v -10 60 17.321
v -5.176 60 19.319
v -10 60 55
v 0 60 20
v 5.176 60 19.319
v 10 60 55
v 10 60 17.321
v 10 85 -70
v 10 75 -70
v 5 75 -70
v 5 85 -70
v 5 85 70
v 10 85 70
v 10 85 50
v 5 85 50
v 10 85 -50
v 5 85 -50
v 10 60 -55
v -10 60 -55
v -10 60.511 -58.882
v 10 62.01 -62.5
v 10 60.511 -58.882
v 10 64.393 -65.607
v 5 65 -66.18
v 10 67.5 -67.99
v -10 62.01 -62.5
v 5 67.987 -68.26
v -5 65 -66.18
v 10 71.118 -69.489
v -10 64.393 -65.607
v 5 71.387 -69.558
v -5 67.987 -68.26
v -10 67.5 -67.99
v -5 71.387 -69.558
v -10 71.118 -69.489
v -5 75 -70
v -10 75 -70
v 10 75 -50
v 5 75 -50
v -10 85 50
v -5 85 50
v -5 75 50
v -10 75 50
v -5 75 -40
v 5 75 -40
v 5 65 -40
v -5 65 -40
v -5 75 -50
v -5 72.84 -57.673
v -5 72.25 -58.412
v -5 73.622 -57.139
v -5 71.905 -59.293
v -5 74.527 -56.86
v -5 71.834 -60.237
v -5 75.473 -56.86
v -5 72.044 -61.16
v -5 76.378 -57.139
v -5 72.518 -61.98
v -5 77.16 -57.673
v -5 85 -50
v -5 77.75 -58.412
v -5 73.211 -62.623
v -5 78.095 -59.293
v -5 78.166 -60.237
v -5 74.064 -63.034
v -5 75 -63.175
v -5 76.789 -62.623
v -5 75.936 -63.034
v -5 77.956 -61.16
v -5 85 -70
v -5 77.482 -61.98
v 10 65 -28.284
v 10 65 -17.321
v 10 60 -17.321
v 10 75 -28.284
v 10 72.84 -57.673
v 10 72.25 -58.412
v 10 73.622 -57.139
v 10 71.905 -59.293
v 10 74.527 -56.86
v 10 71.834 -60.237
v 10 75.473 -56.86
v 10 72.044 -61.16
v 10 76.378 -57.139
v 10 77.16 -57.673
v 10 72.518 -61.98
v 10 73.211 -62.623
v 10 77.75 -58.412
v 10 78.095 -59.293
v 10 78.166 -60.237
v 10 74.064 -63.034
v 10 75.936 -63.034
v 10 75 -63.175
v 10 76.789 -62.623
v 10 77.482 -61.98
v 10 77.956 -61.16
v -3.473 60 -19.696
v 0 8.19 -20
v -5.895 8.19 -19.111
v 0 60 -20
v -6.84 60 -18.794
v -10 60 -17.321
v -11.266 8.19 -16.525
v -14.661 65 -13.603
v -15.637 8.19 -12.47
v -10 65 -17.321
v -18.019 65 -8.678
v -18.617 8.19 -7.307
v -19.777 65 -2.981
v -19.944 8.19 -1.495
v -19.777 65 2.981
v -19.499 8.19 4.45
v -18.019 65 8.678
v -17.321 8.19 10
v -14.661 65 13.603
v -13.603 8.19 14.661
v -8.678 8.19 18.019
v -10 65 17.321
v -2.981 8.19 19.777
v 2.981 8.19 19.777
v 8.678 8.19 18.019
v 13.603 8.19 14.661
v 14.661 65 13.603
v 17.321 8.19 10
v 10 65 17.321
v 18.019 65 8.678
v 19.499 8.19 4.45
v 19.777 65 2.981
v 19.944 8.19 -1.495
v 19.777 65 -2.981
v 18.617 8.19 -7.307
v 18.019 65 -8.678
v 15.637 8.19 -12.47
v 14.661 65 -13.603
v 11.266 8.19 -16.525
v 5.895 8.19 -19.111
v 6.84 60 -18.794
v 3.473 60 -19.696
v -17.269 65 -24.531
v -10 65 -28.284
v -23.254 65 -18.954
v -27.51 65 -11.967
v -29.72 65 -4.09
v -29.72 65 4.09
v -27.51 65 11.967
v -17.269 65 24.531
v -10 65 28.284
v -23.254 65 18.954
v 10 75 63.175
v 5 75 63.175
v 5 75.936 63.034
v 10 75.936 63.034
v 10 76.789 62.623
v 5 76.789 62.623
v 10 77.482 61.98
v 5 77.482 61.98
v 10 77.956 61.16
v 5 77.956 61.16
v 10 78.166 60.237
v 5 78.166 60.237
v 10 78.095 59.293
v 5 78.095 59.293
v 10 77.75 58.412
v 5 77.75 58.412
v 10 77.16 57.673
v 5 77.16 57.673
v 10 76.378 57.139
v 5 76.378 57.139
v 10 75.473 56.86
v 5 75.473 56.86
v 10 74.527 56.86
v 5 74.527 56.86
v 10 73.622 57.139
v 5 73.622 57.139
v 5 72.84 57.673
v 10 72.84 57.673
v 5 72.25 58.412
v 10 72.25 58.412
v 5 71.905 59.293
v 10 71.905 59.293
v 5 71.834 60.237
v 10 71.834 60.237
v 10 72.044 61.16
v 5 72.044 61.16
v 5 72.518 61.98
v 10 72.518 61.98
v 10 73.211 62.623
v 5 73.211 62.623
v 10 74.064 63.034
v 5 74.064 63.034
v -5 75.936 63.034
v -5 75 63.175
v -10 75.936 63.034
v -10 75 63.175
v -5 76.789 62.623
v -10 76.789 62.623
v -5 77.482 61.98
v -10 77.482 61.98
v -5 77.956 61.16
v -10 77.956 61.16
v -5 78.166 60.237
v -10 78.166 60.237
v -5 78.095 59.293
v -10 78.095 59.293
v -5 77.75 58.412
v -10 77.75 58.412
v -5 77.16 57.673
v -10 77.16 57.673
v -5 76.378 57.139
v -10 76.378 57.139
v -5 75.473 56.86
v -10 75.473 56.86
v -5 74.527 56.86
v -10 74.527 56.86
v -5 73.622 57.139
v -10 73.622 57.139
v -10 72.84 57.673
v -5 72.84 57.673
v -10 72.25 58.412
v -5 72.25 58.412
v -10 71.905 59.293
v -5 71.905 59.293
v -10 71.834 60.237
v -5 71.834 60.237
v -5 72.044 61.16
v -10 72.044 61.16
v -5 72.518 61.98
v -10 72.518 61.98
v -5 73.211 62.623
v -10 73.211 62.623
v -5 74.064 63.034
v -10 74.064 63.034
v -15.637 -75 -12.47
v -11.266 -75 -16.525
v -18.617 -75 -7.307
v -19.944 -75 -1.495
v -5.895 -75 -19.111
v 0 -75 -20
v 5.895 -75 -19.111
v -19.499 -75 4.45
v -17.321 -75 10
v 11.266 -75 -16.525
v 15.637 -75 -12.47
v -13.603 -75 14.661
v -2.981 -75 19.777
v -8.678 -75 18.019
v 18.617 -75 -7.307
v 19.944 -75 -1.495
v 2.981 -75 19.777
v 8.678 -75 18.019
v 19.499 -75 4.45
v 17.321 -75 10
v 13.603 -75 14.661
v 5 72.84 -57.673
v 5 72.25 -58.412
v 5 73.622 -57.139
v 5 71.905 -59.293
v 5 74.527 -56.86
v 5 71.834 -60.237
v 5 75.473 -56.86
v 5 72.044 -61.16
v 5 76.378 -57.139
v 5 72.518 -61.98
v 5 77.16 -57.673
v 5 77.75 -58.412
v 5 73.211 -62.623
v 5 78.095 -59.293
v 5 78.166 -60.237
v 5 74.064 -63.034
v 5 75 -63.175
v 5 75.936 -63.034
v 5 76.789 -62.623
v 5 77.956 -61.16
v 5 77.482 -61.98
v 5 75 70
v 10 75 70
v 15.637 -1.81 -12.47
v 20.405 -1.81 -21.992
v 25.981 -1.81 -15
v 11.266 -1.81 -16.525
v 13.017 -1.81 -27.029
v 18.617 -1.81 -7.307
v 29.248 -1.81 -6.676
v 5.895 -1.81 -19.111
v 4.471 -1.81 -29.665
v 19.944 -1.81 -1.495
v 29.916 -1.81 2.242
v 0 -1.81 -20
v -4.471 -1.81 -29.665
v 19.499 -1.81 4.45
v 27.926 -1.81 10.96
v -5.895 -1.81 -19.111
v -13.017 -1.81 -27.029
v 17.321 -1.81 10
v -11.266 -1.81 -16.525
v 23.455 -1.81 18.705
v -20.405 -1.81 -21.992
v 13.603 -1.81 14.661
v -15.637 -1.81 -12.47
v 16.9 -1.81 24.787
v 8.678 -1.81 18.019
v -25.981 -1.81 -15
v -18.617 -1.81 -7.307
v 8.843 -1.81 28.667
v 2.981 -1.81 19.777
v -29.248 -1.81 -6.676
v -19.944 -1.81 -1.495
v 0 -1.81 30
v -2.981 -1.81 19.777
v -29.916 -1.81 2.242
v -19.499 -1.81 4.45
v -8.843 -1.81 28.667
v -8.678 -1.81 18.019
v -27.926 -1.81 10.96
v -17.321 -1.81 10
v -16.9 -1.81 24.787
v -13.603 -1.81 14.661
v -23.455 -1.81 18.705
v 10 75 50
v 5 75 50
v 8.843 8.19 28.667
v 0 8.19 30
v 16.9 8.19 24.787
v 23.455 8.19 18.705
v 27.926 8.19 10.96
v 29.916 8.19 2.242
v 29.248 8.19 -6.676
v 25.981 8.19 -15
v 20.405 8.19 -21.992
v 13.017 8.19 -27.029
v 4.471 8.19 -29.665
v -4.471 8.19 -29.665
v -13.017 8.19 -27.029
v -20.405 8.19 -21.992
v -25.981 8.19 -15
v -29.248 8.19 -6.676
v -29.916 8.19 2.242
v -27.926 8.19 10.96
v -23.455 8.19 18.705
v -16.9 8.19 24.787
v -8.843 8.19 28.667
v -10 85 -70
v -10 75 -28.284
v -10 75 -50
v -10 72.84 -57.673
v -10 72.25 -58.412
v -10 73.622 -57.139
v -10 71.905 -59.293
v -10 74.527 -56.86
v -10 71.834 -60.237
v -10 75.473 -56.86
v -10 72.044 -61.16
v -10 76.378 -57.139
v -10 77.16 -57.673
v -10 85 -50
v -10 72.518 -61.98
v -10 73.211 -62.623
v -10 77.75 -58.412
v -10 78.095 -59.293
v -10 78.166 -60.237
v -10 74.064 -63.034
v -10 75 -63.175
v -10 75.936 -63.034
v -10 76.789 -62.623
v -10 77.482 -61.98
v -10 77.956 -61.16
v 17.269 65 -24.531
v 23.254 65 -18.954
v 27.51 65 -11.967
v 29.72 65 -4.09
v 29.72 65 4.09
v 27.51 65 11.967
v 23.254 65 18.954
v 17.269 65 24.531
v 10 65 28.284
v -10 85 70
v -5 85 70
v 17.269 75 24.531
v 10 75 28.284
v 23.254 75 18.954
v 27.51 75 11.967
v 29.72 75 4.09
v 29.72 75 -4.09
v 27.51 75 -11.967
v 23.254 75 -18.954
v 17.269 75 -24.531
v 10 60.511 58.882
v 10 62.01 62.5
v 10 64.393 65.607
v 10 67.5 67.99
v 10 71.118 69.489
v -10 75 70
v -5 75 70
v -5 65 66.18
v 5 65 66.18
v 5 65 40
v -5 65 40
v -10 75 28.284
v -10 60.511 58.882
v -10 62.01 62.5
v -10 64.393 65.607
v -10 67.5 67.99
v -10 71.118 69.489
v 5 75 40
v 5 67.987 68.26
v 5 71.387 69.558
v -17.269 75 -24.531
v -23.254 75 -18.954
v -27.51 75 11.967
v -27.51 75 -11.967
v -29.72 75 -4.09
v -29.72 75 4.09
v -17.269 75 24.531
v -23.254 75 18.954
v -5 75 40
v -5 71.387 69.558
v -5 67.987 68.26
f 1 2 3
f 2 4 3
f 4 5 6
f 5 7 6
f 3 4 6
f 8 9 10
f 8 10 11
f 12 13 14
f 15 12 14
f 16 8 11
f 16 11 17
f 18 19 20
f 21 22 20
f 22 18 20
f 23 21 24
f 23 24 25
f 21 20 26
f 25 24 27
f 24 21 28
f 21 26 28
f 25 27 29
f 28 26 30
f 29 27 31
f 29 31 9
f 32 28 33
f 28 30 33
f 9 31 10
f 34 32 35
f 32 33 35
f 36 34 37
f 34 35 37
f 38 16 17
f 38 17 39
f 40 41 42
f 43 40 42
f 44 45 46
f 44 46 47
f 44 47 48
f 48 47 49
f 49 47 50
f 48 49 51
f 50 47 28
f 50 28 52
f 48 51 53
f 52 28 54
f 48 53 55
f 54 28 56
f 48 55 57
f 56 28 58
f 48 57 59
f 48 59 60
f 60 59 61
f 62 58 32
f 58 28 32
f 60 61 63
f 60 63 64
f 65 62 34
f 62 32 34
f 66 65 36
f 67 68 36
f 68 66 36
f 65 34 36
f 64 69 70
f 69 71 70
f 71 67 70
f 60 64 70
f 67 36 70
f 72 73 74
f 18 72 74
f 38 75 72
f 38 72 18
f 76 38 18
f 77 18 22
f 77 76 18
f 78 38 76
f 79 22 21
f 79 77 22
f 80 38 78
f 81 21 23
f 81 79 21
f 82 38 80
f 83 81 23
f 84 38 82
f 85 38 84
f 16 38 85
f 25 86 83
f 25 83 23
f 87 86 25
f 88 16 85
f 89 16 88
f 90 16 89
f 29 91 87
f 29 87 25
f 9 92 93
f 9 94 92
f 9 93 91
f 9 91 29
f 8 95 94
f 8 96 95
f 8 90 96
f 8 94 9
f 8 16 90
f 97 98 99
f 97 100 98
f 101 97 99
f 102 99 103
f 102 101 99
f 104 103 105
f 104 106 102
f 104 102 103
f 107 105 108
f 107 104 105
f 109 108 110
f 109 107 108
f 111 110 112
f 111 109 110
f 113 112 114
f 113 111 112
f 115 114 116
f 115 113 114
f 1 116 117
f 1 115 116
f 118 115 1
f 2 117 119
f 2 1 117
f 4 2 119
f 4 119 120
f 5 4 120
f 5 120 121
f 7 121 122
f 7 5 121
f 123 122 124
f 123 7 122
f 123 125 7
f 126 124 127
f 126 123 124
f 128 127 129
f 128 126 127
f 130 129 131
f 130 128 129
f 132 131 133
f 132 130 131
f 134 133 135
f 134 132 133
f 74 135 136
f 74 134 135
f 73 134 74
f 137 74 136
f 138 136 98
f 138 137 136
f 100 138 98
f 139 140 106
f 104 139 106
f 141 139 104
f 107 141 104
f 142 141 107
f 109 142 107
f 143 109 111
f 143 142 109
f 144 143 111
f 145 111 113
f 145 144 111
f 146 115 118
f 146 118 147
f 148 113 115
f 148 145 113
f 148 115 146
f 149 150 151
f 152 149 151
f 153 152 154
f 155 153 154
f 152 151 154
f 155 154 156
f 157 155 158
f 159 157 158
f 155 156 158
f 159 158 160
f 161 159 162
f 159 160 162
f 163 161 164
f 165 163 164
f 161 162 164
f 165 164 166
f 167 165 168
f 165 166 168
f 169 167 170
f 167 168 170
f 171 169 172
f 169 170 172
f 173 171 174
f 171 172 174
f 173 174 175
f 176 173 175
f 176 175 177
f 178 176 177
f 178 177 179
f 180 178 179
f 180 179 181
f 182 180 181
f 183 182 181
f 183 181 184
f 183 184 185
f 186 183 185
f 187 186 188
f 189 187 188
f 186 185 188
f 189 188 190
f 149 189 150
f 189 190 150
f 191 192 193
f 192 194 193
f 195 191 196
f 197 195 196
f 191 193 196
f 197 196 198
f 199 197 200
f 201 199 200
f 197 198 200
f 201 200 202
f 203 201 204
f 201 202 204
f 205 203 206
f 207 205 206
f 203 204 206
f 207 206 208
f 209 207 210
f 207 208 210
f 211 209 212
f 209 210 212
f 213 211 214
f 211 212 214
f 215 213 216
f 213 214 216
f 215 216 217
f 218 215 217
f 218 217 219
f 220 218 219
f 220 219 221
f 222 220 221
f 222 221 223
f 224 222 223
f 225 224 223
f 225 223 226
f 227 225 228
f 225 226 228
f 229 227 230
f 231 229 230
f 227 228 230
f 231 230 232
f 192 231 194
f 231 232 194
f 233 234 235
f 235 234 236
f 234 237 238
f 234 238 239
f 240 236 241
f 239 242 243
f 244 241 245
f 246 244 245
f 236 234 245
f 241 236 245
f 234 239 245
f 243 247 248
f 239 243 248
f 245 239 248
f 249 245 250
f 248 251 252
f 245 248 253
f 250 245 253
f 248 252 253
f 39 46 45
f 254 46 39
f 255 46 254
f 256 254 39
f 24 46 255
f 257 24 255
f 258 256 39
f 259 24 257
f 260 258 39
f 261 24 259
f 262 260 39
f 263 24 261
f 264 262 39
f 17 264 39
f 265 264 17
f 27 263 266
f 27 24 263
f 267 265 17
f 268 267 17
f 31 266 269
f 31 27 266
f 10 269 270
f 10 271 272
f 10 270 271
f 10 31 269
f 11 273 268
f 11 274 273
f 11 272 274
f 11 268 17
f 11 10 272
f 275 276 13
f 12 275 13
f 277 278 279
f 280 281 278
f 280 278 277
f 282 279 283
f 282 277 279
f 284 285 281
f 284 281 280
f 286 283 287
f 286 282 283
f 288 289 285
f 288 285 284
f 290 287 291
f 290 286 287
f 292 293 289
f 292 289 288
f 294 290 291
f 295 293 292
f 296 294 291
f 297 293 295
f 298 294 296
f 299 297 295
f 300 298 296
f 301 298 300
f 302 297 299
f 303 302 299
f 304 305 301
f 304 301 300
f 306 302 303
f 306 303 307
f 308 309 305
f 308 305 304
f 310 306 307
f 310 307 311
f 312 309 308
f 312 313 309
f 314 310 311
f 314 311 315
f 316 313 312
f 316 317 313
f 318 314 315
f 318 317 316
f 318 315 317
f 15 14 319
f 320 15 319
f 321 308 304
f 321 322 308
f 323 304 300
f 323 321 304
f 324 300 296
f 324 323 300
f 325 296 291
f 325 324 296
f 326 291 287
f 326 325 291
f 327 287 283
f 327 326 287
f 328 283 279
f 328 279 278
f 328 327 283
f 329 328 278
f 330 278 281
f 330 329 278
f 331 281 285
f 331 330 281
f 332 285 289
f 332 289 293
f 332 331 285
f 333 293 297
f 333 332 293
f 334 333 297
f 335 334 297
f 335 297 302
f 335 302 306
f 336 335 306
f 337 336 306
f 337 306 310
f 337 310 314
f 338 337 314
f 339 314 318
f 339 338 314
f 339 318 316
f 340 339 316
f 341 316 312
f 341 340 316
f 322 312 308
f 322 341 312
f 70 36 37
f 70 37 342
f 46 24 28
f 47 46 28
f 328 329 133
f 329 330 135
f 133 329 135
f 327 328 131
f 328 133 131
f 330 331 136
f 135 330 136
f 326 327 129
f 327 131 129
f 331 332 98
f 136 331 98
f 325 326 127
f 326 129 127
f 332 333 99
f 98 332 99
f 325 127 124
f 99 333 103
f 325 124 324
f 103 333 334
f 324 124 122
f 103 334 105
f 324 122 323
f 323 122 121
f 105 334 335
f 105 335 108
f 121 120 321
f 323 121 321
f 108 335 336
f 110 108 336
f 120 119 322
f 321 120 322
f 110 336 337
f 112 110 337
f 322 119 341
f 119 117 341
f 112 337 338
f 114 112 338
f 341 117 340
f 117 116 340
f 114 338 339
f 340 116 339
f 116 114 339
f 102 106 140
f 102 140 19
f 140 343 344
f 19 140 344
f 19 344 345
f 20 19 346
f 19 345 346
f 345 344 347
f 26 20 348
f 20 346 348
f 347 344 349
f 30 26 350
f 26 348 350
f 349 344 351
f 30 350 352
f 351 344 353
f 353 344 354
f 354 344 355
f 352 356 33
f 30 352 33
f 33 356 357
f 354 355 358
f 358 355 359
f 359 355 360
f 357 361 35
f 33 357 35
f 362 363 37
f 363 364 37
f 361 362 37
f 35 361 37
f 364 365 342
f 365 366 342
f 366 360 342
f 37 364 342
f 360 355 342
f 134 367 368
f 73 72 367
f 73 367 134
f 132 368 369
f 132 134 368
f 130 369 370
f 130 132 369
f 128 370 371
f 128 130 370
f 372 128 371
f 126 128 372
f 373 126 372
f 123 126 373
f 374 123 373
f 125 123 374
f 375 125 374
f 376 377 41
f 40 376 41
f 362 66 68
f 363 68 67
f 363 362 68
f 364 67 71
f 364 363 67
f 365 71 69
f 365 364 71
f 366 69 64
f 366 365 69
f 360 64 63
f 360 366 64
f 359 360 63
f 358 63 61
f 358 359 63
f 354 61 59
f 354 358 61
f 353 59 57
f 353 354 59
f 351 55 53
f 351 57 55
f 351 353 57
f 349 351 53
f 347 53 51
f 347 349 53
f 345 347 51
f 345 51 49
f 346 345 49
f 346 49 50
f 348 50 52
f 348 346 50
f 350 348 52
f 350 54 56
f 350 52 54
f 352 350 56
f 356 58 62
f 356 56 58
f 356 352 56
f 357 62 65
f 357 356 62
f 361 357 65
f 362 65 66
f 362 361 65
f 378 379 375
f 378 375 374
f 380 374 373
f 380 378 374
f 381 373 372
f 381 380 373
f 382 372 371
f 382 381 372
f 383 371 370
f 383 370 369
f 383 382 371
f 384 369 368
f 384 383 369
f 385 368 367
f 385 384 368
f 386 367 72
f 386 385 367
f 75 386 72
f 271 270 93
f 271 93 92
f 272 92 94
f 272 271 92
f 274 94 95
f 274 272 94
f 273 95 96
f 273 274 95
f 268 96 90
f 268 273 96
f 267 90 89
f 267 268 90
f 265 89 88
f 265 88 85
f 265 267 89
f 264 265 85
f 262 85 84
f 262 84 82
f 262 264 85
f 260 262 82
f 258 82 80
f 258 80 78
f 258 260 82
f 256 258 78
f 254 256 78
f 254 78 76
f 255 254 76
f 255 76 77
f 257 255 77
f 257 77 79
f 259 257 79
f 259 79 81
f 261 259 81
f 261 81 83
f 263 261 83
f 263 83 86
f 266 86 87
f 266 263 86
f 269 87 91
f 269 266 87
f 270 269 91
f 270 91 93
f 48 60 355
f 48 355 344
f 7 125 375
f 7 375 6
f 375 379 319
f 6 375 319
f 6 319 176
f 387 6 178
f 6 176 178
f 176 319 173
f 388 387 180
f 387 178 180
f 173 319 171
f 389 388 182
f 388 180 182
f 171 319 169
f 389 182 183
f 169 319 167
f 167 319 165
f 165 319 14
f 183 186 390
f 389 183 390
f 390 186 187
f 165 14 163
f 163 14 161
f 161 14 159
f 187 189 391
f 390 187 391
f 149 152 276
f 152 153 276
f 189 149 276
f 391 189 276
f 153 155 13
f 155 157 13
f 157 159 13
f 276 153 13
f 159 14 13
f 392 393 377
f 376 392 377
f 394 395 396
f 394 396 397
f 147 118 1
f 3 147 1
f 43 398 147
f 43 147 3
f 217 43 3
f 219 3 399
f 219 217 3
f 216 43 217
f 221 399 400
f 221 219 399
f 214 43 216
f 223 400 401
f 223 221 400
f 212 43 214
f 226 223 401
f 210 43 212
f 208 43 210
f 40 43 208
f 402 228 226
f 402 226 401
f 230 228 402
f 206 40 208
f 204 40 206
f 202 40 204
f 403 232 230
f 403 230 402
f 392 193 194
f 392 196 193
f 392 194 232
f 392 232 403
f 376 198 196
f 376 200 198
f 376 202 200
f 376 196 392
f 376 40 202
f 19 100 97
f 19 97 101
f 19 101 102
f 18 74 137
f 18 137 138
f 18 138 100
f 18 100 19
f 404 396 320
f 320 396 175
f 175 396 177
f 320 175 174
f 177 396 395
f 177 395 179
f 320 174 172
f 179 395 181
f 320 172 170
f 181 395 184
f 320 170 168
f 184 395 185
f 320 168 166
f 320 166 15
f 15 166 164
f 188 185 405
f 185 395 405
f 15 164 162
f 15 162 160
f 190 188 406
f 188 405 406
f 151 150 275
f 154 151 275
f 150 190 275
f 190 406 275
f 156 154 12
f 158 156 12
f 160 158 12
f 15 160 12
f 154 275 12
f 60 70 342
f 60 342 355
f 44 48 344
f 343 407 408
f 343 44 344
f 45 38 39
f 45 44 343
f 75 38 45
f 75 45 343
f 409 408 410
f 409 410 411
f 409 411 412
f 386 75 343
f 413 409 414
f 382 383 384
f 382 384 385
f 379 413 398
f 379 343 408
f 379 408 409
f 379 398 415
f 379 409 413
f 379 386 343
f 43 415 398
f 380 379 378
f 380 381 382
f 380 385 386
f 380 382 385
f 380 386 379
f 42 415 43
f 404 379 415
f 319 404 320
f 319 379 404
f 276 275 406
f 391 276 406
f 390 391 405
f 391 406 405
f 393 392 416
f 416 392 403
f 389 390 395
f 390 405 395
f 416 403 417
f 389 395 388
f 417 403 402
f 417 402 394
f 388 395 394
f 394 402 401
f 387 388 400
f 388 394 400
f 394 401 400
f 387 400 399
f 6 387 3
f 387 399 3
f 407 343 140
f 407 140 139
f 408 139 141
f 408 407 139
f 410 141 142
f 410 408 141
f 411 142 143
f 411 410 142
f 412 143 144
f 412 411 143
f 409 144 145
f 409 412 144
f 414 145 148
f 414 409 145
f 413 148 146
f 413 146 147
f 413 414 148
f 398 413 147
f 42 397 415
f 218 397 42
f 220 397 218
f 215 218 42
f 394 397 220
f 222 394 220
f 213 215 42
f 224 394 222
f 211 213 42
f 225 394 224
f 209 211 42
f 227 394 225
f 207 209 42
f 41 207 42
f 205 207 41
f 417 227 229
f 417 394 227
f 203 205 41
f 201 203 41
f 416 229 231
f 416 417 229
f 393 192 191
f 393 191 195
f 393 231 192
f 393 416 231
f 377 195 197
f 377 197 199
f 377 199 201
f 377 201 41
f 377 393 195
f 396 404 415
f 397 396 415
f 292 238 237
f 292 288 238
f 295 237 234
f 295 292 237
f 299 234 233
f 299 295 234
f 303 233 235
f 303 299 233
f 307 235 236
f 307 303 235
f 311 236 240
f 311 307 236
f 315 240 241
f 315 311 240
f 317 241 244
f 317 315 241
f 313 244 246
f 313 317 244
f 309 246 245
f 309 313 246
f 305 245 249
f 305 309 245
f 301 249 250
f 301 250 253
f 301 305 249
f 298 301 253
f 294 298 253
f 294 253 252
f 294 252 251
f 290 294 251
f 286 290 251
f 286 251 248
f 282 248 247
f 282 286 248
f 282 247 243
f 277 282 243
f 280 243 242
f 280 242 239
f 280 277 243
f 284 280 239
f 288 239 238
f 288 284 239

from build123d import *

# Parameters (mm, degrees)
SKETCH1_R            = 30
BOSS_EXTRUDE1_DEPTH  = 75
SKETCH2_W            = 10
SKETCH2_H            = 56.81
SKETCH2_H_2          = 73.19
SKETCH3_R            = 3.175
BOSS_EXTRUDE2_DEPTH  = 10
SKETCH5_W            = 10
SKETCH5_H            = 20
CUT_EXTRUDE2_DEPTH   = 30
FILLET1_R            = 15
FILLET1_OF_MIRROR1_R = 15


with BuildPart() as part:
    # Sketch1 → Boss-Extrude1 (new, symmetric)
    with BuildSketch(Plane(origin=(0, 0, 0), x_dir=(1, 0, 0), z_dir=(0, 1, 0))):
        with Locations(Location((0, 0, 0), (0, 0, 270))):
            Circle(SKETCH1_R)
    extrude(amount=BOSS_EXTRUDE1_DEPTH, both=True)

    # Sketch2 → Cut-Revolve1 (revolve, cut)
    with BuildSketch(Plane(origin=(0, 0, 0), x_dir=(0, 0, -1), z_dir=(1, 0, 0))):
        with Locations((25, 36.595)):
            Rectangle(SKETCH2_W, SKETCH2_H)
        with Locations((25, -38.405)):
            Rectangle(SKETCH2_W, SKETCH2_H_2)
    revolve(axis=Axis((0, -1000, 0), (0, 1, 0)), mode=Mode.SUBTRACT)

    # Sketch3 → Boss-Extrude2 (add, symmetric)
    with BuildSketch(Plane(origin=(0, 0, 0), x_dir=(0, 0, -1), z_dir=(1, 0, 0))):
        Polygon((0, 75), (0, 60), (70, 60), (70, 85), (50, 85), (50, 75), align=None)
        with Locations((60, 75)):
            Circle(SKETCH3_R, mode=Mode.SUBTRACT)
    boss_extrude2 = extrude(amount=BOSS_EXTRUDE2_DEPTH, both=True)

    # Sketch5 → Cut-Extrude2 (cut)
    with BuildSketch(Plane(origin=(0, 0, -70), x_dir=(-1, 0, 0), z_dir=(0, 0, -1))):
        with Locations((0, 75)):
            Rectangle(SKETCH5_W, SKETCH5_H)
    cut_extrude2 = extrude(amount=-CUT_EXTRUDE2_DEPTH, mode=Mode.SUBTRACT)

    # Fillet1
    # the kernel refuses this fillet: 15 mm, written as the material it takes off along each edge
    with BuildSketch(Plane(origin=(-47.5, 60, -70), x_dir=(0, 0, 1), z_dir=(1, 0, 0))) as fillet1_piece_1:
        with BuildLine():
            CenterArc((FILLET1_R, -FILLET1_R), FILLET1_R, 90, 90)
            Line((0, -FILLET1_R), (0, 0))
            Line((0, 0), (FILLET1_R, 0))
        make_face()
    extrude(amount=95, mode=Mode.SUBTRACT)

    # Mirror1: Boss-Extrude2, Cut-Extrude2 across plane
    add(boss_extrude2.mirror(Plane.XY))
    add(cut_extrude2.mirror(Plane.XY), mode=Mode.SUBTRACT)

    # Fillet1 of Mirror1
    # the kernel refuses this fillet: 15 mm, written as the material it takes off along each edge
    with BuildSketch(Plane(origin=(-47.5, 60, 70), x_dir=(0, 0, -1), z_dir=(1, 0, 0))) as fillet1_of_mirror1_piece_1:
        with BuildLine():
            CenterArc((FILLET1_OF_MIRROR1_R, FILLET1_OF_MIRROR1_R), FILLET1_OF_MIRROR1_R, 180, 90)
            Line((0, FILLET1_OF_MIRROR1_R), (0, 0))
            Line((0, 0), (FILLET1_OF_MIRROR1_R, 0))
        make_face()
    extrude(amount=95, mode=Mode.SUBTRACT)


solid = part.part
